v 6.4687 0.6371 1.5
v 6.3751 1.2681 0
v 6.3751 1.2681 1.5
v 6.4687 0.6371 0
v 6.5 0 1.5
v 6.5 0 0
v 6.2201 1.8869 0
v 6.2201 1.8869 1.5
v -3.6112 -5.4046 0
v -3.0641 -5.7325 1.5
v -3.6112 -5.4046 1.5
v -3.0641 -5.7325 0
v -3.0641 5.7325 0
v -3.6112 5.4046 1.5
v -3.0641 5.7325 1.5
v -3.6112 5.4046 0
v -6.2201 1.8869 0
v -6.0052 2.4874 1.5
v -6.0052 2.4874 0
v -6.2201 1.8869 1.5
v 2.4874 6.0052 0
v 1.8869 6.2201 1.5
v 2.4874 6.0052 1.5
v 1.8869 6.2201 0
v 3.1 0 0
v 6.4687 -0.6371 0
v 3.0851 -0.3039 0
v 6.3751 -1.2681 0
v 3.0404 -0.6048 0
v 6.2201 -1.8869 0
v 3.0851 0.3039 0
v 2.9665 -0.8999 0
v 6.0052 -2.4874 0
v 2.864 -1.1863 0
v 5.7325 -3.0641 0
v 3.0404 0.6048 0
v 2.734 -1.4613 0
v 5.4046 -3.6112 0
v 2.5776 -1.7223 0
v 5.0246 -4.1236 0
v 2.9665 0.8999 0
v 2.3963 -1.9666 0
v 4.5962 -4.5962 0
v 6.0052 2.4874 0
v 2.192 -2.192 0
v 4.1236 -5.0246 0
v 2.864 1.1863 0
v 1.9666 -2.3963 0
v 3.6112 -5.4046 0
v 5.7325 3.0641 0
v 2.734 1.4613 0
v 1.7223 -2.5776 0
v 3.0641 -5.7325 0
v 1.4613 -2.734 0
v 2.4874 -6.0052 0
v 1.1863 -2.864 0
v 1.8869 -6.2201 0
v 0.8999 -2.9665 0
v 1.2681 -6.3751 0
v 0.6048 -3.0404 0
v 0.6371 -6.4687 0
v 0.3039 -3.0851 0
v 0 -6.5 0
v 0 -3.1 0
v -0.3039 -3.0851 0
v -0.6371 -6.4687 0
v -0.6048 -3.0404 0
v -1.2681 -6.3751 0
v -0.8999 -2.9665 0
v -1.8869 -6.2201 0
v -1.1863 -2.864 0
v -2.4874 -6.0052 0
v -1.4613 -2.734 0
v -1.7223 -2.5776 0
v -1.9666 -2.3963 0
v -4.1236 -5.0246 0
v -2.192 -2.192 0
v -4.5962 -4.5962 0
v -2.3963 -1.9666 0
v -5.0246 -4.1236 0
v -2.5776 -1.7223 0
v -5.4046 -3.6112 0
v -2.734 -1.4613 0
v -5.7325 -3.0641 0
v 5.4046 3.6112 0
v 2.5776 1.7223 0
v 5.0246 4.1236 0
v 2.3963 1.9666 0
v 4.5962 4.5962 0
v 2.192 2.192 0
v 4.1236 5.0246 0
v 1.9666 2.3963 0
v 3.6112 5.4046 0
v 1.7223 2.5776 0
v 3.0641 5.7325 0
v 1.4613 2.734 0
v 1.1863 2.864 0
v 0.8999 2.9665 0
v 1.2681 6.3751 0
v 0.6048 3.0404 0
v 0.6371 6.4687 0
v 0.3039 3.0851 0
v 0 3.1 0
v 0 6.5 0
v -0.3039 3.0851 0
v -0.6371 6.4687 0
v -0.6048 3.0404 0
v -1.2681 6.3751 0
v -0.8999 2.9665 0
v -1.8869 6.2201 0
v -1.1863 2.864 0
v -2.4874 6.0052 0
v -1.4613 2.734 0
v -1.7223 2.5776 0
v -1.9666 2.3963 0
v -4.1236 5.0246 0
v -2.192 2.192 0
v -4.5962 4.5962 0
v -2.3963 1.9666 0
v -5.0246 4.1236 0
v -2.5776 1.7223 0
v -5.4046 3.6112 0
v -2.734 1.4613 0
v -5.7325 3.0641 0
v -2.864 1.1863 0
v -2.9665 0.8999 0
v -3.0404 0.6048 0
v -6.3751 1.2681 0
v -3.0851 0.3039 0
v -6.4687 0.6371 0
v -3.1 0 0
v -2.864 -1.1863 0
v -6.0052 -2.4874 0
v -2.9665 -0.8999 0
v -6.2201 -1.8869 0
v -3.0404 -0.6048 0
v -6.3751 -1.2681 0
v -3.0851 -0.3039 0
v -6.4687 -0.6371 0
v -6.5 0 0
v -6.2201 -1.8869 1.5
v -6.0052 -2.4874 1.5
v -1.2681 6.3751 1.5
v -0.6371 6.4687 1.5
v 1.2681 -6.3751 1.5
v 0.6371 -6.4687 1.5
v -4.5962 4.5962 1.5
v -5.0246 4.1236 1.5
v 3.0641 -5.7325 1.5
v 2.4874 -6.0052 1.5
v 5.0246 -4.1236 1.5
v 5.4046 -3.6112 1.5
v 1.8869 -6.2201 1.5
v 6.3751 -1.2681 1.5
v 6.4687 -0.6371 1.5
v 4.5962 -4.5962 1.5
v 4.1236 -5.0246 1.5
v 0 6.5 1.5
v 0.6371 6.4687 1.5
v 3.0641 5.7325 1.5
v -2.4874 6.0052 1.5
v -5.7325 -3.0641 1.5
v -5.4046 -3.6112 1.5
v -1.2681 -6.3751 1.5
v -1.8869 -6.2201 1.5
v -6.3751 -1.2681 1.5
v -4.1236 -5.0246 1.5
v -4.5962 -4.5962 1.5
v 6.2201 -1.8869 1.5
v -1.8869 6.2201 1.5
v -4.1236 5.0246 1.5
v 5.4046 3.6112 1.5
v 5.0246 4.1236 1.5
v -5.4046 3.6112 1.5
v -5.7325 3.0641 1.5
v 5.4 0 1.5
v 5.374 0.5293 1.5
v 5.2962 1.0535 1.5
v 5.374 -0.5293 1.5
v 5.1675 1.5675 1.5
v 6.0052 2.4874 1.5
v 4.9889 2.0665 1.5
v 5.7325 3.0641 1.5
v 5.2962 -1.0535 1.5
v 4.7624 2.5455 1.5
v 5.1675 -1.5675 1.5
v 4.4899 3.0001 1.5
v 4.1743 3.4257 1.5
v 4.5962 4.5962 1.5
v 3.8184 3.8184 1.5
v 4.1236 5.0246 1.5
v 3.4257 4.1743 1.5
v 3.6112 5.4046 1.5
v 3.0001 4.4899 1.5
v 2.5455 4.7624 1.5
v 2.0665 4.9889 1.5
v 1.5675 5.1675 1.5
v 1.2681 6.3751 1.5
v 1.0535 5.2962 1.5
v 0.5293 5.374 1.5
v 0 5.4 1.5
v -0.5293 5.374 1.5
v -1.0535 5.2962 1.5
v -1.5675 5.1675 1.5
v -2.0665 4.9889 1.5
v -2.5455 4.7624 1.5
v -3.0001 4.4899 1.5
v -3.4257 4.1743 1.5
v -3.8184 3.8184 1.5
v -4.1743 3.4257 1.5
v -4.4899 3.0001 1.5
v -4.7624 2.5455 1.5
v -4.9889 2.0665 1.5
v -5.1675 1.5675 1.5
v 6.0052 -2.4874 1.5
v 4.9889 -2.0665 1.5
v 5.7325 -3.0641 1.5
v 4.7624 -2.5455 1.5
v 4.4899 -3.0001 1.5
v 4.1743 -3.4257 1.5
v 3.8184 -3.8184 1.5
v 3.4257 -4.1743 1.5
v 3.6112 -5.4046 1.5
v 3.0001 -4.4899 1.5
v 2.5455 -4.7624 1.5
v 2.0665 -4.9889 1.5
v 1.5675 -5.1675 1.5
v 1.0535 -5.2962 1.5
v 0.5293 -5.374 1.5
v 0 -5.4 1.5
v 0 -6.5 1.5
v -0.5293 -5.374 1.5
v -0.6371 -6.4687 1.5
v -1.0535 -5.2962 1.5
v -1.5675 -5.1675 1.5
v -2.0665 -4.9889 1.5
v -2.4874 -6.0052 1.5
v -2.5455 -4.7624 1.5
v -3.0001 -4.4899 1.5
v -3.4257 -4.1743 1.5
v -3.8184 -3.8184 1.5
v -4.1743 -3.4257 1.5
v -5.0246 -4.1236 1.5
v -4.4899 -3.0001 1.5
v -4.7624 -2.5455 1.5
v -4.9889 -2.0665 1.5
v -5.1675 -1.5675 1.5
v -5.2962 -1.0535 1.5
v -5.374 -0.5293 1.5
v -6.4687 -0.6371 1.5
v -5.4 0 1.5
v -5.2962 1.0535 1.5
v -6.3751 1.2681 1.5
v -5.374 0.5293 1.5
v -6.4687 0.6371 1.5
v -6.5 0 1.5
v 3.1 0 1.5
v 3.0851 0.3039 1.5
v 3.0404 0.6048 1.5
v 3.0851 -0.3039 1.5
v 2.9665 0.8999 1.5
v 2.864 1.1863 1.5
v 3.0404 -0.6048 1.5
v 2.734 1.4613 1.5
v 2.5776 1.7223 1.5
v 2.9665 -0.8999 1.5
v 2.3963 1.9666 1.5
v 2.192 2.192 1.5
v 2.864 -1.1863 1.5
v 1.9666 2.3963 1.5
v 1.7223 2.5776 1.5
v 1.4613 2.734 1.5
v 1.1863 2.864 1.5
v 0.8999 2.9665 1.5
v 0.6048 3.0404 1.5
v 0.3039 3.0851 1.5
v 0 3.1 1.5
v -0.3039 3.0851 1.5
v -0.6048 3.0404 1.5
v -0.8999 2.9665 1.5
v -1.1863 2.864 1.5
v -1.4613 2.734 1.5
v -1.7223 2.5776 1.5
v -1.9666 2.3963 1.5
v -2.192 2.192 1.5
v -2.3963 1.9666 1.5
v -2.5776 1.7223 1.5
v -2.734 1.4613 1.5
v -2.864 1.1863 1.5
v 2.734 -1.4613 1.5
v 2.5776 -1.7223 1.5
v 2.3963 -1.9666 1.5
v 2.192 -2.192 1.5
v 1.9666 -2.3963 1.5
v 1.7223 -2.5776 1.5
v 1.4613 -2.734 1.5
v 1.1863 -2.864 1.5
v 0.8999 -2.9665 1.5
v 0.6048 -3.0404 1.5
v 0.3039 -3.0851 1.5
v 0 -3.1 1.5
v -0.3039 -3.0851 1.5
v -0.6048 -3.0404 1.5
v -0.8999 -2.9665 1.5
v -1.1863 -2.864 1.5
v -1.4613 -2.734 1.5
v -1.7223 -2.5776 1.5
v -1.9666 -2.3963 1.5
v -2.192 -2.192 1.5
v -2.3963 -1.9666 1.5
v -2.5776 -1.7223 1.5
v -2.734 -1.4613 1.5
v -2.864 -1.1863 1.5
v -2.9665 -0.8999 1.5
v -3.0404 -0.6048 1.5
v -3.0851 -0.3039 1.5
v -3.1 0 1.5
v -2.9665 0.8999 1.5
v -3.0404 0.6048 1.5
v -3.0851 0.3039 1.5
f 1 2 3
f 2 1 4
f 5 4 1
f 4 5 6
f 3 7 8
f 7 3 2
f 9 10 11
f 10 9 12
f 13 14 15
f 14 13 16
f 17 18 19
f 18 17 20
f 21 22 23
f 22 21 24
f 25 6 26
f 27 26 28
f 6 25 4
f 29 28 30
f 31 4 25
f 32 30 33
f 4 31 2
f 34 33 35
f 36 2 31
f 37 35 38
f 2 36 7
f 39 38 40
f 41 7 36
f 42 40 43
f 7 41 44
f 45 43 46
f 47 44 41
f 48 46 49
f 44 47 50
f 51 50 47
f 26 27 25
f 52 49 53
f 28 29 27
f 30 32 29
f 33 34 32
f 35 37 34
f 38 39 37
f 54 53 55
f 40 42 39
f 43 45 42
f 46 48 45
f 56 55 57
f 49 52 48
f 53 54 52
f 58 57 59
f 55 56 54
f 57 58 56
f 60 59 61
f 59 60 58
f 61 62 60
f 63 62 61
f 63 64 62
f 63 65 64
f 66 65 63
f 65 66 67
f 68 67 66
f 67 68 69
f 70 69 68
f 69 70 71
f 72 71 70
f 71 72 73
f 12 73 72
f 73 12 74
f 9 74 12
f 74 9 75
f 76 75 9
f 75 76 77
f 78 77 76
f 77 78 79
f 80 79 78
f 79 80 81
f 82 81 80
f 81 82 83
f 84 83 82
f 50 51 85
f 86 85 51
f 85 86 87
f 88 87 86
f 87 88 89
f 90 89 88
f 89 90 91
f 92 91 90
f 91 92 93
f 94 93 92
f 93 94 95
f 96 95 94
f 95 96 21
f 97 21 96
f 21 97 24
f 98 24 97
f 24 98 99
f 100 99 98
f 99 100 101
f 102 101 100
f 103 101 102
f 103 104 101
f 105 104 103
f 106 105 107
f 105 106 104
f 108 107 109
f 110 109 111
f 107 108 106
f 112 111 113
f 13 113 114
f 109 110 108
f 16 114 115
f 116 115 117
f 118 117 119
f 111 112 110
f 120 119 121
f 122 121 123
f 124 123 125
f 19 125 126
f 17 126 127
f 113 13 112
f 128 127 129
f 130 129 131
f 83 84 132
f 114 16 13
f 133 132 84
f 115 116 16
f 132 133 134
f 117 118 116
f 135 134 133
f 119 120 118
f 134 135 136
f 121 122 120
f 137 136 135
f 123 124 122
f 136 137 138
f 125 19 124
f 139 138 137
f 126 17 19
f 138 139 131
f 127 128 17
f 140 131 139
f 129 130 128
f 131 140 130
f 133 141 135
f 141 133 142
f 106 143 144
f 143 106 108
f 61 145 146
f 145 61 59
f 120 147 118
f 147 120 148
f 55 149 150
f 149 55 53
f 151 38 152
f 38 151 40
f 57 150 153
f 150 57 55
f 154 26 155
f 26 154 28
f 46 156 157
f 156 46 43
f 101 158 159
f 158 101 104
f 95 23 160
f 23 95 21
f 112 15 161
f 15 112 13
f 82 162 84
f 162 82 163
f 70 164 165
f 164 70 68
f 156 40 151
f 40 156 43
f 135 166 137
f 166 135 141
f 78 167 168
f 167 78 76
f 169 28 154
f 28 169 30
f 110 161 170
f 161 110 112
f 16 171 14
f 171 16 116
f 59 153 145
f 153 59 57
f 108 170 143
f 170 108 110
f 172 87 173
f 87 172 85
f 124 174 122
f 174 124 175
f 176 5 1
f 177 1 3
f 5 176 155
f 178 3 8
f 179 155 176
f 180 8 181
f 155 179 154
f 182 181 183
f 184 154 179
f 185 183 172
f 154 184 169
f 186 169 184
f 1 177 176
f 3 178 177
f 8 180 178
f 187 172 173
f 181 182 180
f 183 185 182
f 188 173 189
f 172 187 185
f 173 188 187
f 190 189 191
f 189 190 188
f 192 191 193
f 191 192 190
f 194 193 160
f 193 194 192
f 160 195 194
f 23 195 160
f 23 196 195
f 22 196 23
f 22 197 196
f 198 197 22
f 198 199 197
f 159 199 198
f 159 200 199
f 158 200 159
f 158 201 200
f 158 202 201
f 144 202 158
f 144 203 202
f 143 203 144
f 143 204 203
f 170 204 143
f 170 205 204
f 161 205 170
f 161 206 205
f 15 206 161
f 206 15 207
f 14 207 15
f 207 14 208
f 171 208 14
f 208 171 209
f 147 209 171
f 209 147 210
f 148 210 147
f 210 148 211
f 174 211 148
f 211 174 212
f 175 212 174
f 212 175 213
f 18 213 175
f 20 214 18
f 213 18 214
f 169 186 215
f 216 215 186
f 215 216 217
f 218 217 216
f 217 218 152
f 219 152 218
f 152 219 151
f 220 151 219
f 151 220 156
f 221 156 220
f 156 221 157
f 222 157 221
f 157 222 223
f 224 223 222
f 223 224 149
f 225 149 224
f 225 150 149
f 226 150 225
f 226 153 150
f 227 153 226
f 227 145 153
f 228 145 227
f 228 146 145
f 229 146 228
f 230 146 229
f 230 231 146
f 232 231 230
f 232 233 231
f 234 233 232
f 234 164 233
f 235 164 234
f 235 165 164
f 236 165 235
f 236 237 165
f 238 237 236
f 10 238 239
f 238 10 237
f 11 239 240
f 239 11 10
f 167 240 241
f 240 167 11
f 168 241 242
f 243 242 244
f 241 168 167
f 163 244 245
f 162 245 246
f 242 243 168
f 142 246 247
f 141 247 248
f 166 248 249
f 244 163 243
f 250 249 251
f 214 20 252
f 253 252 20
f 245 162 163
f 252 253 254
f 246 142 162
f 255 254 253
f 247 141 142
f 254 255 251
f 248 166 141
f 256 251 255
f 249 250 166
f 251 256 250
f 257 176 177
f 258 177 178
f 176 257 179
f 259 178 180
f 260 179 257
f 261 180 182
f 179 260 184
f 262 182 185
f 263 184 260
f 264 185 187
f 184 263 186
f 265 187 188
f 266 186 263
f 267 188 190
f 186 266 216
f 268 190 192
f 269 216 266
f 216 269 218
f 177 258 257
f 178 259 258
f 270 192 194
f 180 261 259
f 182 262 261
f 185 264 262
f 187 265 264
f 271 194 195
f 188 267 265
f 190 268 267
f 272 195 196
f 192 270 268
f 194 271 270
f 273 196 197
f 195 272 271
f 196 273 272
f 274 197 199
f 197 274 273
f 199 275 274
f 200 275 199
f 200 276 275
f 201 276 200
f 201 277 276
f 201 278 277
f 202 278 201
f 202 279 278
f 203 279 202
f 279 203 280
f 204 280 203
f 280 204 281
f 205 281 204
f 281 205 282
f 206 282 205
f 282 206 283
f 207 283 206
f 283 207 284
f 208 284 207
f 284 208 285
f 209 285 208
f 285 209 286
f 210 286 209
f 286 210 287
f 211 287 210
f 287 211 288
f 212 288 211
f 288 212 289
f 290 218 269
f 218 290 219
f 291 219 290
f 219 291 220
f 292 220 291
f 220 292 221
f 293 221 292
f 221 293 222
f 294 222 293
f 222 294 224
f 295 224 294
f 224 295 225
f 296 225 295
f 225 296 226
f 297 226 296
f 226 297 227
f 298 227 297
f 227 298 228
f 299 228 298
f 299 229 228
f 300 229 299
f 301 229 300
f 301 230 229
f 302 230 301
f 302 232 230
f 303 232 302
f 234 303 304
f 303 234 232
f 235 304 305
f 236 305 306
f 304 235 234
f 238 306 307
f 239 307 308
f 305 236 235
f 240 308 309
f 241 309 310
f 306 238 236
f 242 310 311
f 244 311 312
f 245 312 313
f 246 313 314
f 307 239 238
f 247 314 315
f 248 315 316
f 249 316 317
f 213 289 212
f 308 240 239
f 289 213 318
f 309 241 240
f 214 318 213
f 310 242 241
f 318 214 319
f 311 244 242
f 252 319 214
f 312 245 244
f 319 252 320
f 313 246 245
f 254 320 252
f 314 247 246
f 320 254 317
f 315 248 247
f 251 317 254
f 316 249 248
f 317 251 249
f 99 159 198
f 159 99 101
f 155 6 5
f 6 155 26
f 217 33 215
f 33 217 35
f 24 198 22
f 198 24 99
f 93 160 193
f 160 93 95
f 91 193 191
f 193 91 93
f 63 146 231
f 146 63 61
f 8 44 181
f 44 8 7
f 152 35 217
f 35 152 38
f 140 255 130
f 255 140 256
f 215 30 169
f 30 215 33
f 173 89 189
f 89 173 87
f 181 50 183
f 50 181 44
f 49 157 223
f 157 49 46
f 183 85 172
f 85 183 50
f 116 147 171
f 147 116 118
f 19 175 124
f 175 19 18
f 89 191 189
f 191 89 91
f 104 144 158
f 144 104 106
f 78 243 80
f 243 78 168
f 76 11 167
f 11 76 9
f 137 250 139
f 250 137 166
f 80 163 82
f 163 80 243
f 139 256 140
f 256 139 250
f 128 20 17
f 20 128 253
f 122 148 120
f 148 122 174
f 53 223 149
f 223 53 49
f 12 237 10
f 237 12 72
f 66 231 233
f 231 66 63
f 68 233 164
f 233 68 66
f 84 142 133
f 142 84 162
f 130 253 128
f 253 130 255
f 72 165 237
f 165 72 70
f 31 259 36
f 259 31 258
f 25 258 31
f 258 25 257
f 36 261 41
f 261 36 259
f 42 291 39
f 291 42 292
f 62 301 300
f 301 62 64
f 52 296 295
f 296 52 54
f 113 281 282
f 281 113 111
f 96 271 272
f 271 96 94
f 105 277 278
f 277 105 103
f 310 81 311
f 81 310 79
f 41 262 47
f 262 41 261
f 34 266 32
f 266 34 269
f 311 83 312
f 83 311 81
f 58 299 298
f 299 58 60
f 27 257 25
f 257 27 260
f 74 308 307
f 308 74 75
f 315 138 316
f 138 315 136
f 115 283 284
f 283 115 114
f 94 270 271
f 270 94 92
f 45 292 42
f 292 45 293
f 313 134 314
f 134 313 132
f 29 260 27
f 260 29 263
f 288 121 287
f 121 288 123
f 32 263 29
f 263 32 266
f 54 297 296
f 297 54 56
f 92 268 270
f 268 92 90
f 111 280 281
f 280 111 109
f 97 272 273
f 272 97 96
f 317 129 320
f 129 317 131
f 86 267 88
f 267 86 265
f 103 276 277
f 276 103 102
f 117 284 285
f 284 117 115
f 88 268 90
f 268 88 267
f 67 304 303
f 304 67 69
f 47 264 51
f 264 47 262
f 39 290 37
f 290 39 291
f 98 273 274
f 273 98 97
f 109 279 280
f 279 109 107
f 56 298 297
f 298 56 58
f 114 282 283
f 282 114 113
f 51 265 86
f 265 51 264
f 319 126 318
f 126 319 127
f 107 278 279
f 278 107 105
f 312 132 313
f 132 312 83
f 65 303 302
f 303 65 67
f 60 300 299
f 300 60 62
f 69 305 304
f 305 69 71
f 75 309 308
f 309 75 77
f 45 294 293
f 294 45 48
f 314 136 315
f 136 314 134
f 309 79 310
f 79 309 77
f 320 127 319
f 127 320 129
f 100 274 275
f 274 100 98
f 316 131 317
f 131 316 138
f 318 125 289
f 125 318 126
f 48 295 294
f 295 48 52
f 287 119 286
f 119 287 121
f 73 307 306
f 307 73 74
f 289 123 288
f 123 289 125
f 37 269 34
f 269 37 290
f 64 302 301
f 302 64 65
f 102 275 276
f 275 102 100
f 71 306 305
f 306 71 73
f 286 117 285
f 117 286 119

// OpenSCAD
// Adapter sleeve: 0.2 mL PCR tube into a 1.5 mL rack hole
// Print orientation: collar (13 mm dia, 1.5 mm thick) on the bed (z = 0..1.5),
// sleeve body (10.8 mm OD) rising to z = 21.5, with a 6.2 mm bore through the full height.

$fn = 64;

// --- Dimensions (mm) ---
collar_dia   = 13.0;   // collar outer diameter
collar_thk   = 1.5;    // collar thickness (z = 0 to 1.5)
sleeve_od    = 10.8;   // sleeve body outer diameter
sleeve_top   = 21.5;   // top of sleeve body (z)
bore_dia     = 6.2;    // straight bore diameter, open at both ends

// --- Derived radii ---
collar_r = collar_dia / 2;   // 6.5
sleeve_r = sleeve_od  / 2;   // 5.4
bore_r   = bore_dia   / 2;   // 3.1

// --- Build the solid, centred on the origin in X and Y, resting on z = 0 ---
difference() {
    // Collar: 13 mm dia, 1.5 mm thick, sitting on the bed
    cylinder(h = collar_thk, d = collar_dia, $fn = $fn);

    // Sleeve body: 10.8 mm OD, from the top of the collar up to z = 21.5
    translate([0, 0, collar_thk])
        cylinder(h = sleeve_top - collar_thk, d = sleeve_od, $fn = $fn);

    // Bore: 6.2 mm dia, through the full height, open at both ends.
    // Extended 1 mm past each face so no faces are exactly coplanar.
    translate([0, 0, -1])
        cylinder(h = sleeve_top + 2, d = bore_dia, $fn = $fn);
}
